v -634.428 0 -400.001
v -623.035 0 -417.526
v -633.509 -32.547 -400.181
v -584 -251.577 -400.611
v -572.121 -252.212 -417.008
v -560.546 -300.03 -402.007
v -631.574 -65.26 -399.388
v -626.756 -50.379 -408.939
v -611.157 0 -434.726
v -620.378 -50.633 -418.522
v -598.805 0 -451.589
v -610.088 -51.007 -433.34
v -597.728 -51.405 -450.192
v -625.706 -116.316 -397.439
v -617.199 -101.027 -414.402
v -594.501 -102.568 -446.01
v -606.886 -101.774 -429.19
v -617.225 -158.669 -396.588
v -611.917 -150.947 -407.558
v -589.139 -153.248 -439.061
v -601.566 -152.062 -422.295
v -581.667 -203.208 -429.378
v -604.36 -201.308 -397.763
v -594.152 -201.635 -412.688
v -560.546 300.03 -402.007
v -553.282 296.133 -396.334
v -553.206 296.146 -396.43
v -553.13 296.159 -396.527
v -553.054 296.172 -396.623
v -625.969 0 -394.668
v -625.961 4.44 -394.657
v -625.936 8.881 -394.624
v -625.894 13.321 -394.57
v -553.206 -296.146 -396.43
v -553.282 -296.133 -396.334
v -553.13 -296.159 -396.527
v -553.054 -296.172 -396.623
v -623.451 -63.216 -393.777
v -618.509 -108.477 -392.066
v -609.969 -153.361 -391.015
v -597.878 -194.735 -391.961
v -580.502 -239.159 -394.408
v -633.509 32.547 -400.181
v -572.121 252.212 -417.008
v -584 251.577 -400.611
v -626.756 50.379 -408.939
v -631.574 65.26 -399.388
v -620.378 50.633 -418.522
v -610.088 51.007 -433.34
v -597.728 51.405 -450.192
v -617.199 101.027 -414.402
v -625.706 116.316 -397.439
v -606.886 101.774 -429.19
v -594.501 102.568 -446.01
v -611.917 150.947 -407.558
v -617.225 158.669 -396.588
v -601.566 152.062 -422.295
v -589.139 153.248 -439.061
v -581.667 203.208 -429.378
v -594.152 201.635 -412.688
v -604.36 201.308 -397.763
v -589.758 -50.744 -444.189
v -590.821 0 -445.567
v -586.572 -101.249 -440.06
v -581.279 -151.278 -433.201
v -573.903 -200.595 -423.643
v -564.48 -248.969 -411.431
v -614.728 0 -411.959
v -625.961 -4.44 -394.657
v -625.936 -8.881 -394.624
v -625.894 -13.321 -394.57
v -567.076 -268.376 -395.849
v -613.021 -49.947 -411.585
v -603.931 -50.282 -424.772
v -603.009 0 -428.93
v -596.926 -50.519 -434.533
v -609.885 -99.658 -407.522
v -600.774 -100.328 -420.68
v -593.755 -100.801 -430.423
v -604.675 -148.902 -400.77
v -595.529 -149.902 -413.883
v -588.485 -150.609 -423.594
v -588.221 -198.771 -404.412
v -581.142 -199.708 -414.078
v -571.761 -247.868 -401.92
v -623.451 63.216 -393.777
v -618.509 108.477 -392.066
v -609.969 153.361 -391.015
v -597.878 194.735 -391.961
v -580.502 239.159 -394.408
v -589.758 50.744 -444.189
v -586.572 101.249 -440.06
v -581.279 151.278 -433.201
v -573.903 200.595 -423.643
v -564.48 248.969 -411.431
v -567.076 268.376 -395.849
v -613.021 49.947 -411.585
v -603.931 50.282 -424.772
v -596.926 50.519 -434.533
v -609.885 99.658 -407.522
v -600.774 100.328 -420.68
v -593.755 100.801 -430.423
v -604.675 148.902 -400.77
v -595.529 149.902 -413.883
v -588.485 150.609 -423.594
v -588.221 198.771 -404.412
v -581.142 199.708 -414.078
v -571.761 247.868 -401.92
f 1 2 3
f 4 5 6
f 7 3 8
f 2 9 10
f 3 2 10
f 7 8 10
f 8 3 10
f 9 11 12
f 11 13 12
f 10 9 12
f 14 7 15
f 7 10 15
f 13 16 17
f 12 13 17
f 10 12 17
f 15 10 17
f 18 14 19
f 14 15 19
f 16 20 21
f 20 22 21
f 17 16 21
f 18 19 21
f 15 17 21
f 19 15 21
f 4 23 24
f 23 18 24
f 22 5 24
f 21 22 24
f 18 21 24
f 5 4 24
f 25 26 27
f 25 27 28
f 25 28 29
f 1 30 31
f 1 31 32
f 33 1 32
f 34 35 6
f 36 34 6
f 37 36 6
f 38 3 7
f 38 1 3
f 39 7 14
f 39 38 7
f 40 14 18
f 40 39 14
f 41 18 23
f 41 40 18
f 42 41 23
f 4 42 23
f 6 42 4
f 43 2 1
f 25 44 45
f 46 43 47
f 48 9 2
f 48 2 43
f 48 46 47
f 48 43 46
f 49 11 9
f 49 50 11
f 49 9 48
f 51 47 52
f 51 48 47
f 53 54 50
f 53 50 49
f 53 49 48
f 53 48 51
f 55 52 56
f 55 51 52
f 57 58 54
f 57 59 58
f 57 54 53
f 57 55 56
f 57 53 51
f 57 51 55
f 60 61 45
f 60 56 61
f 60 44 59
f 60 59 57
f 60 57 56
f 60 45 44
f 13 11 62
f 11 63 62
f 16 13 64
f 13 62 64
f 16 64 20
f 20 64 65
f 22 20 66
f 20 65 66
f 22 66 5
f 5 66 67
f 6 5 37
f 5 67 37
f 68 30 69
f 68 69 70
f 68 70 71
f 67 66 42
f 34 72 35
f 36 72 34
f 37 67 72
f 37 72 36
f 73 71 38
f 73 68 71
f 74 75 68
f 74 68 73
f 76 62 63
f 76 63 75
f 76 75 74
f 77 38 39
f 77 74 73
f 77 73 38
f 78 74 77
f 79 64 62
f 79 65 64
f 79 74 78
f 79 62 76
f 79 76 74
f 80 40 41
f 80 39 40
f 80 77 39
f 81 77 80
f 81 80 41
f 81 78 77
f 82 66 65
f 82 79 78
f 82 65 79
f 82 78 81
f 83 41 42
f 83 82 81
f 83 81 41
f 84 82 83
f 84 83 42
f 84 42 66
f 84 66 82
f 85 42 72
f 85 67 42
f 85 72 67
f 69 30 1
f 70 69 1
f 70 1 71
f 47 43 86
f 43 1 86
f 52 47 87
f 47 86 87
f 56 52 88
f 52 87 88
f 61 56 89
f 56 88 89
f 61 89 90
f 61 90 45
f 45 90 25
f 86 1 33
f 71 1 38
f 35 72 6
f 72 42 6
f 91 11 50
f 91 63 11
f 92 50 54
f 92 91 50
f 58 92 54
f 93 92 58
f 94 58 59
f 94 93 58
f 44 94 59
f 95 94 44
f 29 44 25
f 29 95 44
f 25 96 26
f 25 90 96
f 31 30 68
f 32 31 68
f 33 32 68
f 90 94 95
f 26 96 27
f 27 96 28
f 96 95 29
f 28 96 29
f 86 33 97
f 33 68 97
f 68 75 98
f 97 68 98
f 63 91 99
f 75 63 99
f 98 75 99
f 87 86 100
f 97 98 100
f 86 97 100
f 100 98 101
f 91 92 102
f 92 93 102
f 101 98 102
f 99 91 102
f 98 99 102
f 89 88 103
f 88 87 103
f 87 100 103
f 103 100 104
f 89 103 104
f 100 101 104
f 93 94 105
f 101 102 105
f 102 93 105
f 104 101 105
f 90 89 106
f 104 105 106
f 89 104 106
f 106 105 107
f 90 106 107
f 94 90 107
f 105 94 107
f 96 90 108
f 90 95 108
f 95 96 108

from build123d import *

# Parameters (mm, degrees)
F6_DEPTH = 19


with BuildPart() as f5:
    # F5: sweep along a path in F2
    with BuildLine(Plane(origin=(-156.9128723683, 0, 121.0798651188), x_dir=(0, 1, 0), z_dir=(0.7917022321, 0, -0.6109071744))) as f5_path:
        ThreePointArc((0, -723.3381067993), (153.2482539983, -707.5144974892), (300.03, -660.7113671899))
    # F0 (on Front) → F5 (sweep)
    with BuildSketch(Plane.XZ):
        with BuildLine():
            Line((-625.9692876951, -394.6675193912), (-634.4283321235, -400.0008642479))
            ThreePointArc((-634.4283321235, -400.0008642479), (-617.1560796043, -426.1670721764), (-598.805311294, -451.5885286033))
            Line((-598.805311294, -451.5885286033), (-590.8212404767, -445.567348222))
            ThreePointArc((-590.8212404767, -445.567348222), (-608.9273318763, -420.4848445474), (-625.9692876951, -394.6675193912))
        make_face()
    sweep(path=f5_path.line)

    # F4 (on 3pt) → F6 (cut, symmetric)
    with BuildSketch(Plane(origin=(-593.1662002197, 143.328193903, -409.6012519616), x_dir=(-0.1604734695, -0.980800128, -0.1108123389), z_dir=(-0.8070756825, 0.1950156632, -0.5573129586))):
        with BuildLine():
            add(Edge.make_bspline(
                [(146.1339469779, 31.3459994524), (90.7328605324, 29.650500126), (-17.5735954351, 33.4542379482), (-114.0268957899, -0.1560465685), (-159.7693573046, -12.2861504718)],
                knots=[0, 0, 0, 0, 0.5135674958, 1, 1, 1, 1], degree=3))
            Line((146.1339469779, 31.3459994524), (148.5447883606, 94.4522917271))
            Line((148.5447883606, 94.4522917271), (-149.4097858667, 94.4522917271))
            Line((-149.4097858667, 94.4522917271), (-190.5195564032, 25.3297034651))
            Line((-190.5195564032, 25.3297034651), (-159.7693573046, -12.2861504718))
        make_face()
    extrude(amount=F6_DEPTH, both=True, mode=Mode.SUBTRACT)

    # F7: F5 across face


with BuildPart() as f5_1:
    add(f5.part)
    add(f5.part.mirror(Plane(origin=(-612.8723427908, 0, -423.2090075375), x_dir=(1, 0, 0), z_dir=(0, -1, 0))))


solid = f5_1.part
